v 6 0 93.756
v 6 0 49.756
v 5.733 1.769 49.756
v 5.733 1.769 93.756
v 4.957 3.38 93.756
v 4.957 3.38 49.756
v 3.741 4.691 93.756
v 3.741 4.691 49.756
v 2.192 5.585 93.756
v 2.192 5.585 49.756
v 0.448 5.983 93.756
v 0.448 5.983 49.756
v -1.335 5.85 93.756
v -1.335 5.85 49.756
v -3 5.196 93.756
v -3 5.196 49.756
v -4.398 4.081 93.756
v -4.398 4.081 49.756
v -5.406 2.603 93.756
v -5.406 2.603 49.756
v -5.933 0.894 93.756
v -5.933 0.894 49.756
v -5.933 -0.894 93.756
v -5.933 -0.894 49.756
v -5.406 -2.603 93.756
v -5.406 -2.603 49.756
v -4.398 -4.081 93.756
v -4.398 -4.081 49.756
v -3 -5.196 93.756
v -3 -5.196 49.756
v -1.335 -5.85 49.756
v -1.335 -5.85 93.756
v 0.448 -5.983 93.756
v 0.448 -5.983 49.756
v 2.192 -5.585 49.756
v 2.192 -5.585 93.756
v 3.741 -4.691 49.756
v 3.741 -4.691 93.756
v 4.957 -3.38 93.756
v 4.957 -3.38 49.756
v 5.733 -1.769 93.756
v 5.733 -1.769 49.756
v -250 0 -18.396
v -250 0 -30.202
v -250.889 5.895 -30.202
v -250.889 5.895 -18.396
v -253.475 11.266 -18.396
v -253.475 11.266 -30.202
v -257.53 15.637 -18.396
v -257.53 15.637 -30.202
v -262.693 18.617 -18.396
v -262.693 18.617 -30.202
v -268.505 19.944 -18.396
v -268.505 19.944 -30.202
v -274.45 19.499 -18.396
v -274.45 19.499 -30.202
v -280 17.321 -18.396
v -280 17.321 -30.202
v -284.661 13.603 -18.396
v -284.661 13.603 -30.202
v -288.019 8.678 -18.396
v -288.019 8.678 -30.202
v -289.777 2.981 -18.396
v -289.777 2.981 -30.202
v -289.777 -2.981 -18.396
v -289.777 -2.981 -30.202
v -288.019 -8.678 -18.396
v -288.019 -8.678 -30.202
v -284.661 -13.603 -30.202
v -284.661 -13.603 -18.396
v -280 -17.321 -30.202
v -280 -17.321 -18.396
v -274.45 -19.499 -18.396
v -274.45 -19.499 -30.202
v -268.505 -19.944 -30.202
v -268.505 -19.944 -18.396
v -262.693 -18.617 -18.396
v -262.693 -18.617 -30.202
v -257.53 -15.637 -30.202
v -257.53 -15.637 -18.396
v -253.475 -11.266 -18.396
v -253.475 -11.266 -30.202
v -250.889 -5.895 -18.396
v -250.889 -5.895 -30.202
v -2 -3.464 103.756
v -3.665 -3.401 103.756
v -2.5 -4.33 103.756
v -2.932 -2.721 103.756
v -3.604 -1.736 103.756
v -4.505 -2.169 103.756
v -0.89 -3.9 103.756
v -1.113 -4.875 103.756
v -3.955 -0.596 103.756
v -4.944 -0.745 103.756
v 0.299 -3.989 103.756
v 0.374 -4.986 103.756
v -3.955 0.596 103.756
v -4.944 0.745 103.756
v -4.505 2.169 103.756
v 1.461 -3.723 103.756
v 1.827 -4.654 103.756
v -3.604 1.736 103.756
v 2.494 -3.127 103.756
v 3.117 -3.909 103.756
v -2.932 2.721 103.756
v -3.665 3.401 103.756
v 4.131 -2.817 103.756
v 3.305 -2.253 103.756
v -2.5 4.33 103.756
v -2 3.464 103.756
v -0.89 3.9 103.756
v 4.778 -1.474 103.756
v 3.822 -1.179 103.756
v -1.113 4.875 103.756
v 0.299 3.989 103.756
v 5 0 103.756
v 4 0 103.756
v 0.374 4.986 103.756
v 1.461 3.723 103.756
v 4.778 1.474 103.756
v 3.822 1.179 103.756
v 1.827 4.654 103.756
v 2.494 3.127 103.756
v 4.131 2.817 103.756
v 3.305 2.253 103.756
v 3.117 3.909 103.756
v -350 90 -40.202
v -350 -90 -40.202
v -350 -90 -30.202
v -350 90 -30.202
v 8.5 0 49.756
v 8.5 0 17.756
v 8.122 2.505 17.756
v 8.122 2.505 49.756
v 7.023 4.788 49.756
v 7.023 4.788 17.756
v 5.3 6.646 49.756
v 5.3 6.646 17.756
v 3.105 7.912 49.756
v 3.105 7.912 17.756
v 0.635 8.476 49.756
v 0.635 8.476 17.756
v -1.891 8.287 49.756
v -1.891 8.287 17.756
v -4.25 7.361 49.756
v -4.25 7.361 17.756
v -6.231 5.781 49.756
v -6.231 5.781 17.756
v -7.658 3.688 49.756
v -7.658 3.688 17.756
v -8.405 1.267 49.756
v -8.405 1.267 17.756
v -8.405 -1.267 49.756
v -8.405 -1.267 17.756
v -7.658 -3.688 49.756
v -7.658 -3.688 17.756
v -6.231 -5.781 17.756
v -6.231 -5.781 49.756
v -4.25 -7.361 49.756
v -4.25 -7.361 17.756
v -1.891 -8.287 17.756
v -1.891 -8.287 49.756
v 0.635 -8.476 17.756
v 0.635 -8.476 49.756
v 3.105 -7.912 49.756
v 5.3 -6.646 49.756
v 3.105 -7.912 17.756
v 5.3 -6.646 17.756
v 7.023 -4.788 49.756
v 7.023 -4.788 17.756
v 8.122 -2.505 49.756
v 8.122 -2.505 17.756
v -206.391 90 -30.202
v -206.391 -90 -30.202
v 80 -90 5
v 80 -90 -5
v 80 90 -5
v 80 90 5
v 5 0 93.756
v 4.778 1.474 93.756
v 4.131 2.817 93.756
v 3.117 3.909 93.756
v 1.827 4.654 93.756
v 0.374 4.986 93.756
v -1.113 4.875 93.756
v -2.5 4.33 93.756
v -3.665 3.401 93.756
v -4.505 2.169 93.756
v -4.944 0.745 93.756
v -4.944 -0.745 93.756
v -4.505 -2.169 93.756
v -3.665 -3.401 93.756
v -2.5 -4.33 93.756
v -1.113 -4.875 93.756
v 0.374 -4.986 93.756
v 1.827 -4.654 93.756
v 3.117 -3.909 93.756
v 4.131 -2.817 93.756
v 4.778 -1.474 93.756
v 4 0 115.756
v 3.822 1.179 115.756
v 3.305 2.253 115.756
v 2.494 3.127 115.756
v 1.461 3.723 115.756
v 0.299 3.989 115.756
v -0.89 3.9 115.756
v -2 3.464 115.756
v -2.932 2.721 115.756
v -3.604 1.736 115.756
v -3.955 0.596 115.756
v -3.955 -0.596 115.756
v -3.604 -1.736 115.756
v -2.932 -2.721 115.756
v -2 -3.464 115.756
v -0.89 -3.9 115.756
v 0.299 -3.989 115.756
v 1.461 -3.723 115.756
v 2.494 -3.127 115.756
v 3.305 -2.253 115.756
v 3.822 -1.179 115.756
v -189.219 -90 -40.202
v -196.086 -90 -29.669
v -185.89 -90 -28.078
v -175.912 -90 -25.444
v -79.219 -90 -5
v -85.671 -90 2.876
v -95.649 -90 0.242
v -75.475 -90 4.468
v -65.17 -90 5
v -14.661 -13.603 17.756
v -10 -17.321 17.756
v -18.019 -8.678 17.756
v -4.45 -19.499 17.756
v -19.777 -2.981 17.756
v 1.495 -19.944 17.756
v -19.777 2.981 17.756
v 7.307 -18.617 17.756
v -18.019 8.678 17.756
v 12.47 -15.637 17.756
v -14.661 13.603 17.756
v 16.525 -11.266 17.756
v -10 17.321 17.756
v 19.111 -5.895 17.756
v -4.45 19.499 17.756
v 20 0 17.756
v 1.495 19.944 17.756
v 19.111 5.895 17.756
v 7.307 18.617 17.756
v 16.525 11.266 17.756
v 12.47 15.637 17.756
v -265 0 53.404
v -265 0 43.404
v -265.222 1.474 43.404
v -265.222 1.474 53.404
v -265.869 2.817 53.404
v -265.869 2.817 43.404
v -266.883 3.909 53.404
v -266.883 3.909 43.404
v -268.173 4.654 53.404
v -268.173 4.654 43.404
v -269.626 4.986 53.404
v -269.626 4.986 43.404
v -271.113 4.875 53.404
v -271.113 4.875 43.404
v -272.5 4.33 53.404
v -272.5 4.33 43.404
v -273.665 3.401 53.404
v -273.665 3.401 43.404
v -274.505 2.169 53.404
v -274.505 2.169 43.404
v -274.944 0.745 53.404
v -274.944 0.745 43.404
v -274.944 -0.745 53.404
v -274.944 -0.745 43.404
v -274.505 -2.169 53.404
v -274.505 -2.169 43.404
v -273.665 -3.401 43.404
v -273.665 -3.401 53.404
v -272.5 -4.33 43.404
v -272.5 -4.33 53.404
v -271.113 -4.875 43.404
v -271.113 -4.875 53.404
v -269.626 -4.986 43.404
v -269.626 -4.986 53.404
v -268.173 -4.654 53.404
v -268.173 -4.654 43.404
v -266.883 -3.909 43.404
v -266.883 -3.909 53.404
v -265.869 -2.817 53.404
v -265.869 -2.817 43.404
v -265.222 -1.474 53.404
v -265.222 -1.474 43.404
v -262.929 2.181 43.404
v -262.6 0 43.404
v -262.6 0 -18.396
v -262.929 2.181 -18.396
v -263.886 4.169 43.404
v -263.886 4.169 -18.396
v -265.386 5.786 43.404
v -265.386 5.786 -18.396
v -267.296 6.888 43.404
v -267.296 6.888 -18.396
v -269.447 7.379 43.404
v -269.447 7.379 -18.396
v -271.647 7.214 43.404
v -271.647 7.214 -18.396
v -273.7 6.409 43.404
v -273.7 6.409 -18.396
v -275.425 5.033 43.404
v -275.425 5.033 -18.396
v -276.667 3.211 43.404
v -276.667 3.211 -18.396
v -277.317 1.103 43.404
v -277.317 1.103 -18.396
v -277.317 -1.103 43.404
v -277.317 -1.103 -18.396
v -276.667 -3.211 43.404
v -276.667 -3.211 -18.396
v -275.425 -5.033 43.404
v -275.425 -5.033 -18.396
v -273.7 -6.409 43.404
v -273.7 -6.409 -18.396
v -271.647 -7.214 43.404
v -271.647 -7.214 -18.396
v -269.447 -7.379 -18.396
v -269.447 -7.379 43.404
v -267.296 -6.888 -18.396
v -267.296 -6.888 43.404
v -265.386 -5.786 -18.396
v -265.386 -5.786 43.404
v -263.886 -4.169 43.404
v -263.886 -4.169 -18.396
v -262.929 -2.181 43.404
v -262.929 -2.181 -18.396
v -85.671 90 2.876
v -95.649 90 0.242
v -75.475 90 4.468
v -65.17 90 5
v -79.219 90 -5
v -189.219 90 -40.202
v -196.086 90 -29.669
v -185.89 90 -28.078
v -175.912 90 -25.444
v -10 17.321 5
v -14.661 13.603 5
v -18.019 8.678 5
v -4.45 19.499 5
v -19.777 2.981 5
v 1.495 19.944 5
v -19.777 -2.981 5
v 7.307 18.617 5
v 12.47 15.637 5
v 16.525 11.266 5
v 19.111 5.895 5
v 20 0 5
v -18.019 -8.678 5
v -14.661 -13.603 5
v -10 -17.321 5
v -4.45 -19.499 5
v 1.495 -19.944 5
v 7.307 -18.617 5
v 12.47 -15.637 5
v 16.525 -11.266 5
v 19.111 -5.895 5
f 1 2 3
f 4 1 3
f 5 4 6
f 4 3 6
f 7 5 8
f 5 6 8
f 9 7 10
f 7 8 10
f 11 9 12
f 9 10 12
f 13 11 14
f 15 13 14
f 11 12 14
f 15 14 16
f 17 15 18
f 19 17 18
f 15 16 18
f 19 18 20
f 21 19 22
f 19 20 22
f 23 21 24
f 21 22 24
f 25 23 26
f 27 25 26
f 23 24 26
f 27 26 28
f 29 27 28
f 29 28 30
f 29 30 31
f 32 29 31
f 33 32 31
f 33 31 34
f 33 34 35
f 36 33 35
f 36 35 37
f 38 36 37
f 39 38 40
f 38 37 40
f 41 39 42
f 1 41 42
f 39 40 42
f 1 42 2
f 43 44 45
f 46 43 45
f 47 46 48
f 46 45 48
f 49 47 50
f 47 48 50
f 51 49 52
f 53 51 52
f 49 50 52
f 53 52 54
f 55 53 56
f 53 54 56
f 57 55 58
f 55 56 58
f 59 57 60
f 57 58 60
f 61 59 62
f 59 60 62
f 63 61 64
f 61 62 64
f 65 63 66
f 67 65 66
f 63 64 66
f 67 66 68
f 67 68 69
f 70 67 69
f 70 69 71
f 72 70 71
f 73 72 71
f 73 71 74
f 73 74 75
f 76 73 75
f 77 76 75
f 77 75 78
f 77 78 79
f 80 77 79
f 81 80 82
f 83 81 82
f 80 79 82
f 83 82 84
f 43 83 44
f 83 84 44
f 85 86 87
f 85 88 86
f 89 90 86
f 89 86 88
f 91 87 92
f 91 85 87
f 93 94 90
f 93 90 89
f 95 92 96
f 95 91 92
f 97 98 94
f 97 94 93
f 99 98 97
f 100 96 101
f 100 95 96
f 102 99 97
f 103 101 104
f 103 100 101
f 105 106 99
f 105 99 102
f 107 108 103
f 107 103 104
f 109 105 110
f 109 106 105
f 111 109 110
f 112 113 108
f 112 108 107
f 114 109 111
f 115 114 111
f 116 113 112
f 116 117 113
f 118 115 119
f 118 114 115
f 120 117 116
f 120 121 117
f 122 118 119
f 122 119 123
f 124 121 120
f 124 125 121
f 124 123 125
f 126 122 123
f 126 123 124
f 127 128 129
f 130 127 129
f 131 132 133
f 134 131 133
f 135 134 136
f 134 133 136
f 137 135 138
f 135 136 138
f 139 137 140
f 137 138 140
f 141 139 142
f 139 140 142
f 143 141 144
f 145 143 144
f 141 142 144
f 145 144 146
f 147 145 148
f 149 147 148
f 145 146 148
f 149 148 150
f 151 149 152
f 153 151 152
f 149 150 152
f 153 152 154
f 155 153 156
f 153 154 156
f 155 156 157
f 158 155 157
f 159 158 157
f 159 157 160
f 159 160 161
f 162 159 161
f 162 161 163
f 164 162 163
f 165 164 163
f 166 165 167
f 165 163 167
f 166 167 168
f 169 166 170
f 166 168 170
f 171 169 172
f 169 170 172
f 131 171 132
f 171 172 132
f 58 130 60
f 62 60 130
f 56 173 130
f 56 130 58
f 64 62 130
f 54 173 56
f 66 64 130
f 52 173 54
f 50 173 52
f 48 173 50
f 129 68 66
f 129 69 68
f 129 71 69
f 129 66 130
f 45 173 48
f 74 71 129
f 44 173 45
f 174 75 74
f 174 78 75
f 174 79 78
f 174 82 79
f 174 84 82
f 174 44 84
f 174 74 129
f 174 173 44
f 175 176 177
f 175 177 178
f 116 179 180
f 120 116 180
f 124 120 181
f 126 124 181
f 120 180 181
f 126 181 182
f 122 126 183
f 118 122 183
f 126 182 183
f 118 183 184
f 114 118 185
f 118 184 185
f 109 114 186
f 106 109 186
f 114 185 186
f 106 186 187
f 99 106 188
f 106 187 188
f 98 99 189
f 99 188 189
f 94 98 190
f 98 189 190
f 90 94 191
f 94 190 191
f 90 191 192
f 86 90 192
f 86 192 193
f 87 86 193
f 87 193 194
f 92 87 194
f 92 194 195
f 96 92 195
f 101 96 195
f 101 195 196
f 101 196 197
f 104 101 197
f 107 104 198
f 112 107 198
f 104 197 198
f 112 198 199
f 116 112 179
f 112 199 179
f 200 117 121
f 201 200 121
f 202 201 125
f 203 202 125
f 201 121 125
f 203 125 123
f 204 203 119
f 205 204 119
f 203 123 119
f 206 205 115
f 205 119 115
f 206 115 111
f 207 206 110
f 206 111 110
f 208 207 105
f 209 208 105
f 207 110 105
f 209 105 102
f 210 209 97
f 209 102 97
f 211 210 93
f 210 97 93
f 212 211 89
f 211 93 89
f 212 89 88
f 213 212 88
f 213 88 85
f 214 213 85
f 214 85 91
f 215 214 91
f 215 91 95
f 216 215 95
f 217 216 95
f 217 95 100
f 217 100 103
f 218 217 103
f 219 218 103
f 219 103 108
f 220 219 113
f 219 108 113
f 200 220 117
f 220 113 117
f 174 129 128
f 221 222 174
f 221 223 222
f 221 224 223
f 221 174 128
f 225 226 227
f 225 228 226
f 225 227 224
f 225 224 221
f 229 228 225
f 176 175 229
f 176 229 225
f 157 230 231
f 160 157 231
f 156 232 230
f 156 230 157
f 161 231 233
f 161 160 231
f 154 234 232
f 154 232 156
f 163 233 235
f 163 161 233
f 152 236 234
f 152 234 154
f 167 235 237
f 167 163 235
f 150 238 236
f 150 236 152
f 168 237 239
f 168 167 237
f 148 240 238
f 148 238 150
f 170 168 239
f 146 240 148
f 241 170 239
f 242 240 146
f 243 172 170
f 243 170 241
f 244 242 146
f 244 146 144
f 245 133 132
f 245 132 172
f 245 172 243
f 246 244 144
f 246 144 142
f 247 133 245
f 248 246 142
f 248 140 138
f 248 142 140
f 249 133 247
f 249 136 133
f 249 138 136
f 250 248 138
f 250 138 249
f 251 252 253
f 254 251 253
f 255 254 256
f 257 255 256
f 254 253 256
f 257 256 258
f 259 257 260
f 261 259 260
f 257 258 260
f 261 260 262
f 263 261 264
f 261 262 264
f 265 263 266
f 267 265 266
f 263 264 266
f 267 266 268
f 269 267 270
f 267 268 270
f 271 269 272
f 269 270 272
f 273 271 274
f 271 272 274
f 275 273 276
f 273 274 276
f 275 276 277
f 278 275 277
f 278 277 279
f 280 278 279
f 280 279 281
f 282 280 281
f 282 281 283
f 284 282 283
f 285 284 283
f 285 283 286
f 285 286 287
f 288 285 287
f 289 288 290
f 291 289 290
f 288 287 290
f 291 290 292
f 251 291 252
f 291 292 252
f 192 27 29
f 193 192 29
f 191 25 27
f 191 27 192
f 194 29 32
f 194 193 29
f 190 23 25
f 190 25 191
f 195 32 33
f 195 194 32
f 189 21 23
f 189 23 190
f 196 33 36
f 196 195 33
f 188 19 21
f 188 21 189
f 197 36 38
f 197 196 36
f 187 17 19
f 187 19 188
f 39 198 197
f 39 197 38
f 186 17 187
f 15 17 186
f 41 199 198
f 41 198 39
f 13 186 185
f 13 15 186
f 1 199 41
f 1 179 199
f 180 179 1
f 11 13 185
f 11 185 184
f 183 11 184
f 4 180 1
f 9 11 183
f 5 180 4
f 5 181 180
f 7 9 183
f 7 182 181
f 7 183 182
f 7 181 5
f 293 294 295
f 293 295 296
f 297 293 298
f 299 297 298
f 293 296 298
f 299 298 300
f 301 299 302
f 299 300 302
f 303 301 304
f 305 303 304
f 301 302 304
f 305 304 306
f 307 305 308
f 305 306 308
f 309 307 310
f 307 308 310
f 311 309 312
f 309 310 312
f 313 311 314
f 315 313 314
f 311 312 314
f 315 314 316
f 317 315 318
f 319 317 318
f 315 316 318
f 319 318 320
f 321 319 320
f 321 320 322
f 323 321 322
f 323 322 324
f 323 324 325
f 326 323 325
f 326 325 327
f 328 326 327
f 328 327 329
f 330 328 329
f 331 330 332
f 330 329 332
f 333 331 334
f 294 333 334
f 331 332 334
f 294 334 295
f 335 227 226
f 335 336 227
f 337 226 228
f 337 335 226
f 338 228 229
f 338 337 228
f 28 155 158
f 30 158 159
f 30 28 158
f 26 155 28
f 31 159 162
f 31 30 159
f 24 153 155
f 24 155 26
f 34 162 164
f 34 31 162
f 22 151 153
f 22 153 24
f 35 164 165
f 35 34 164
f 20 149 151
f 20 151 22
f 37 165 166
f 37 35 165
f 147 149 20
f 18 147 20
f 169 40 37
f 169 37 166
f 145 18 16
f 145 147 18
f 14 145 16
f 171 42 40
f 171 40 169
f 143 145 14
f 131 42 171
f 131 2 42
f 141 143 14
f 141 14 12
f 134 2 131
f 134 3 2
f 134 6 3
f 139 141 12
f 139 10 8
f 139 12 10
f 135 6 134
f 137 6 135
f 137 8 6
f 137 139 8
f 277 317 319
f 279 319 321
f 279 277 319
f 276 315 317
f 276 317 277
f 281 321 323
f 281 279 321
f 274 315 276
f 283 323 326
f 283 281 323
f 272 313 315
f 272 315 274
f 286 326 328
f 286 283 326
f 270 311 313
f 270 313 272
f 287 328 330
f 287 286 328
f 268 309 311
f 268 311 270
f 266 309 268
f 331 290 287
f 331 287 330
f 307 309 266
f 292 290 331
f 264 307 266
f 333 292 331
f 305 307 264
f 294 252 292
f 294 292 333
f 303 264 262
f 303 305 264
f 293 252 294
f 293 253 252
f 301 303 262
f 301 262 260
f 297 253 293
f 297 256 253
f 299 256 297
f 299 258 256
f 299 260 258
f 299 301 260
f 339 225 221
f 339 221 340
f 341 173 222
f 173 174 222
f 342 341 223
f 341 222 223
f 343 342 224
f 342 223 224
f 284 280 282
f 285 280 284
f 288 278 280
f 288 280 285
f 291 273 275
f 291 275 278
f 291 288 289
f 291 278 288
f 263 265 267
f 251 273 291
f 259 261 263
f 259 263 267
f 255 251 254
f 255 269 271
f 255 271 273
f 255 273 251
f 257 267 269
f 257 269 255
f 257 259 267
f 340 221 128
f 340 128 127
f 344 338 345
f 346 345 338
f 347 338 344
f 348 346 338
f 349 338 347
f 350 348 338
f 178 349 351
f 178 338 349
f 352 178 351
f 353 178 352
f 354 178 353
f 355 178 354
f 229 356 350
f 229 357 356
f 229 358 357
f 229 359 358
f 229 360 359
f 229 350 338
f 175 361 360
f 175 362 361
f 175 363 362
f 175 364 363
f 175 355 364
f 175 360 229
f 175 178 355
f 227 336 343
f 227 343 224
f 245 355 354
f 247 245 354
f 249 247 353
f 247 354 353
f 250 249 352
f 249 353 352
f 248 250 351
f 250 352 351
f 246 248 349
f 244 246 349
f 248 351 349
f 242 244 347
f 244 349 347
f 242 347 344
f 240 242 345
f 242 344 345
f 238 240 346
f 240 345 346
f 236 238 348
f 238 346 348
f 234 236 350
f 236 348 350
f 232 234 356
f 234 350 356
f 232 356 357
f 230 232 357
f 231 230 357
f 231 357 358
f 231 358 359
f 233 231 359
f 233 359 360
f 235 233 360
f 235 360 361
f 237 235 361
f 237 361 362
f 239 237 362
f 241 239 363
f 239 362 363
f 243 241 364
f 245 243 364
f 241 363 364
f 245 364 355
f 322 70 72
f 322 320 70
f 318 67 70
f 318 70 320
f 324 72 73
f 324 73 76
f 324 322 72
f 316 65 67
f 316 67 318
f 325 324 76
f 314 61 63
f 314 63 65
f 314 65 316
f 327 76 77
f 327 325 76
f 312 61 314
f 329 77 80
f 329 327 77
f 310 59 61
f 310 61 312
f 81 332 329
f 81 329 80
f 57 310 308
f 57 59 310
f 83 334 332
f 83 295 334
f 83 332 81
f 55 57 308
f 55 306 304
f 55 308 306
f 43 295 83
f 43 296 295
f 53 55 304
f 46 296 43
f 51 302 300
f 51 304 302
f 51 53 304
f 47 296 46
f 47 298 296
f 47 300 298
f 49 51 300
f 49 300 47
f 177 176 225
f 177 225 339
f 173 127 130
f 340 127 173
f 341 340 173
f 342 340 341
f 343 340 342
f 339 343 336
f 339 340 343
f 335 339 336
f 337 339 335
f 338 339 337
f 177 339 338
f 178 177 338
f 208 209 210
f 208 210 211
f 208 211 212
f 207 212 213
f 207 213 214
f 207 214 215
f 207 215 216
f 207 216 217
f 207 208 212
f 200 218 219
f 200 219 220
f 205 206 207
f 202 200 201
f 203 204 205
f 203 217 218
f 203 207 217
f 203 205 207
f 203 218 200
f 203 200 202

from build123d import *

# Parameters (mm, degrees)
SCHIZZO16_W                   = 10
SCHIZZO16_H                   = 180
SCHIZZO17_R                   = 20
ESTRUSIONE_ESTRUSIONE10_DEPTH = 12.75569081
SCHIZZO18_R                   = 8.5
ESTRUSIONE_ESTRUSIONE11_DEPTH = 32
SCHIZZO19_R                   = 6
ESTRUSIONE_ESTRUSIONE12_DEPTH = 44
SCHIZZO20_R                   = 5
ESTRUSIONE_ESTRUSIONE13_DEPTH = 10
SCHIZZO21_R                   = 4
ESTRUSIONE_ESTRUSIONE14_DEPTH = 12
SCHIZZO22_R                   = 20
ESTRUSIONE_ESTRUSIONE15_DEPTH = 11.80548778
SCHIZZO23_R                   = 7.4
ESTRUSIONE_ESTRUSIONE16_DEPTH = 61.8
SCHIZZO24_R                   = 5
ESTRUSIONE_ESTRUSIONE17_DEPTH = 10
RACCORDO1_R                   = 100


with BuildPart() as part:
    # Sweep1: sweep along a path in Schizzo15
    with BuildLine(Plane(origin=(0, 0, 0), x_dir=(1, 0, 0), z_dir=(0, 1, 0))) as sweep1_path:
        Line((-350, 35.20194684), (-190, 35.20194684))
        Line((-190, 35.20194684), (-80, 0))
        Line((-80, 0), (80, 0))
    # Schizzo16 → Sweep1 (sweep)
    with BuildSketch(Plane(origin=(0, 0, 0), x_dir=(0, 0, -1), z_dir=(1, 0, 0))):
        Rectangle(SCHIZZO16_W, SCHIZZO16_H)
    sweep(path=sweep1_path.line, transition=Transition.RIGHT)

    # Schizzo17 → Estrusione-Estrusione10 (add)
    with BuildSketch(Plane.XY.offset(5)):
        Circle(SCHIZZO17_R)
    extrude(amount=ESTRUSIONE_ESTRUSIONE10_DEPTH)

    # Schizzo18 → Estrusione-Estrusione11 (add)
    with BuildSketch(Plane.XY.offset(17.75569081)):
        Circle(SCHIZZO18_R)
    extrude(amount=ESTRUSIONE_ESTRUSIONE11_DEPTH)

    # Schizzo19 → Estrusione-Estrusione12 (add)
    with BuildSketch(Plane.XY.offset(49.75569081)):
        Circle(SCHIZZO19_R)
    extrude(amount=ESTRUSIONE_ESTRUSIONE12_DEPTH)

    # Schizzo20 → Estrusione-Estrusione13 (add)
    with BuildSketch(Plane.XY.offset(93.75569081)):
        Circle(SCHIZZO20_R)
    extrude(amount=ESTRUSIONE_ESTRUSIONE13_DEPTH)

    # Schizzo21 → Estrusione-Estrusione14 (add)
    with BuildSketch(Plane.XY.offset(103.75569081)):
        Circle(SCHIZZO21_R)
    extrude(amount=ESTRUSIONE_ESTRUSIONE14_DEPTH)

    # Schizzo22 → Estrusione-Estrusione15 (add)
    with BuildSketch(Plane.XY.offset(-30.20194684)):
        with Locations((-270, 0)):
            Circle(SCHIZZO22_R)
    extrude(amount=ESTRUSIONE_ESTRUSIONE15_DEPTH)

    # Schizzo23 → Estrusione-Estrusione16 (add)
    with BuildSketch(Plane.XY.offset(-18.39645906)):
        with Locations((-270, 0)):
            Circle(SCHIZZO23_R)
    extrude(amount=ESTRUSIONE_ESTRUSIONE16_DEPTH)

    # Schizzo24 → Estrusione-Estrusione17 (add)
    with BuildSketch(Plane.XY.offset(43.40354094)):
        with Locations((-270, 0)):
            Circle(SCHIZZO24_R)
    extrude(amount=ESTRUSIONE_ESTRUSIONE17_DEPTH)

    # Raccordo1
    raccordo1_edges = [part.edges().sort_by_distance(p)[0] for p in [
        (-80.78054705, 0, 5),
        (-190.78054705, 0, -30.20194684),
    ]]
    fillet(raccordo1_edges, radius=RACCORDO1_R)


solid = part.part
